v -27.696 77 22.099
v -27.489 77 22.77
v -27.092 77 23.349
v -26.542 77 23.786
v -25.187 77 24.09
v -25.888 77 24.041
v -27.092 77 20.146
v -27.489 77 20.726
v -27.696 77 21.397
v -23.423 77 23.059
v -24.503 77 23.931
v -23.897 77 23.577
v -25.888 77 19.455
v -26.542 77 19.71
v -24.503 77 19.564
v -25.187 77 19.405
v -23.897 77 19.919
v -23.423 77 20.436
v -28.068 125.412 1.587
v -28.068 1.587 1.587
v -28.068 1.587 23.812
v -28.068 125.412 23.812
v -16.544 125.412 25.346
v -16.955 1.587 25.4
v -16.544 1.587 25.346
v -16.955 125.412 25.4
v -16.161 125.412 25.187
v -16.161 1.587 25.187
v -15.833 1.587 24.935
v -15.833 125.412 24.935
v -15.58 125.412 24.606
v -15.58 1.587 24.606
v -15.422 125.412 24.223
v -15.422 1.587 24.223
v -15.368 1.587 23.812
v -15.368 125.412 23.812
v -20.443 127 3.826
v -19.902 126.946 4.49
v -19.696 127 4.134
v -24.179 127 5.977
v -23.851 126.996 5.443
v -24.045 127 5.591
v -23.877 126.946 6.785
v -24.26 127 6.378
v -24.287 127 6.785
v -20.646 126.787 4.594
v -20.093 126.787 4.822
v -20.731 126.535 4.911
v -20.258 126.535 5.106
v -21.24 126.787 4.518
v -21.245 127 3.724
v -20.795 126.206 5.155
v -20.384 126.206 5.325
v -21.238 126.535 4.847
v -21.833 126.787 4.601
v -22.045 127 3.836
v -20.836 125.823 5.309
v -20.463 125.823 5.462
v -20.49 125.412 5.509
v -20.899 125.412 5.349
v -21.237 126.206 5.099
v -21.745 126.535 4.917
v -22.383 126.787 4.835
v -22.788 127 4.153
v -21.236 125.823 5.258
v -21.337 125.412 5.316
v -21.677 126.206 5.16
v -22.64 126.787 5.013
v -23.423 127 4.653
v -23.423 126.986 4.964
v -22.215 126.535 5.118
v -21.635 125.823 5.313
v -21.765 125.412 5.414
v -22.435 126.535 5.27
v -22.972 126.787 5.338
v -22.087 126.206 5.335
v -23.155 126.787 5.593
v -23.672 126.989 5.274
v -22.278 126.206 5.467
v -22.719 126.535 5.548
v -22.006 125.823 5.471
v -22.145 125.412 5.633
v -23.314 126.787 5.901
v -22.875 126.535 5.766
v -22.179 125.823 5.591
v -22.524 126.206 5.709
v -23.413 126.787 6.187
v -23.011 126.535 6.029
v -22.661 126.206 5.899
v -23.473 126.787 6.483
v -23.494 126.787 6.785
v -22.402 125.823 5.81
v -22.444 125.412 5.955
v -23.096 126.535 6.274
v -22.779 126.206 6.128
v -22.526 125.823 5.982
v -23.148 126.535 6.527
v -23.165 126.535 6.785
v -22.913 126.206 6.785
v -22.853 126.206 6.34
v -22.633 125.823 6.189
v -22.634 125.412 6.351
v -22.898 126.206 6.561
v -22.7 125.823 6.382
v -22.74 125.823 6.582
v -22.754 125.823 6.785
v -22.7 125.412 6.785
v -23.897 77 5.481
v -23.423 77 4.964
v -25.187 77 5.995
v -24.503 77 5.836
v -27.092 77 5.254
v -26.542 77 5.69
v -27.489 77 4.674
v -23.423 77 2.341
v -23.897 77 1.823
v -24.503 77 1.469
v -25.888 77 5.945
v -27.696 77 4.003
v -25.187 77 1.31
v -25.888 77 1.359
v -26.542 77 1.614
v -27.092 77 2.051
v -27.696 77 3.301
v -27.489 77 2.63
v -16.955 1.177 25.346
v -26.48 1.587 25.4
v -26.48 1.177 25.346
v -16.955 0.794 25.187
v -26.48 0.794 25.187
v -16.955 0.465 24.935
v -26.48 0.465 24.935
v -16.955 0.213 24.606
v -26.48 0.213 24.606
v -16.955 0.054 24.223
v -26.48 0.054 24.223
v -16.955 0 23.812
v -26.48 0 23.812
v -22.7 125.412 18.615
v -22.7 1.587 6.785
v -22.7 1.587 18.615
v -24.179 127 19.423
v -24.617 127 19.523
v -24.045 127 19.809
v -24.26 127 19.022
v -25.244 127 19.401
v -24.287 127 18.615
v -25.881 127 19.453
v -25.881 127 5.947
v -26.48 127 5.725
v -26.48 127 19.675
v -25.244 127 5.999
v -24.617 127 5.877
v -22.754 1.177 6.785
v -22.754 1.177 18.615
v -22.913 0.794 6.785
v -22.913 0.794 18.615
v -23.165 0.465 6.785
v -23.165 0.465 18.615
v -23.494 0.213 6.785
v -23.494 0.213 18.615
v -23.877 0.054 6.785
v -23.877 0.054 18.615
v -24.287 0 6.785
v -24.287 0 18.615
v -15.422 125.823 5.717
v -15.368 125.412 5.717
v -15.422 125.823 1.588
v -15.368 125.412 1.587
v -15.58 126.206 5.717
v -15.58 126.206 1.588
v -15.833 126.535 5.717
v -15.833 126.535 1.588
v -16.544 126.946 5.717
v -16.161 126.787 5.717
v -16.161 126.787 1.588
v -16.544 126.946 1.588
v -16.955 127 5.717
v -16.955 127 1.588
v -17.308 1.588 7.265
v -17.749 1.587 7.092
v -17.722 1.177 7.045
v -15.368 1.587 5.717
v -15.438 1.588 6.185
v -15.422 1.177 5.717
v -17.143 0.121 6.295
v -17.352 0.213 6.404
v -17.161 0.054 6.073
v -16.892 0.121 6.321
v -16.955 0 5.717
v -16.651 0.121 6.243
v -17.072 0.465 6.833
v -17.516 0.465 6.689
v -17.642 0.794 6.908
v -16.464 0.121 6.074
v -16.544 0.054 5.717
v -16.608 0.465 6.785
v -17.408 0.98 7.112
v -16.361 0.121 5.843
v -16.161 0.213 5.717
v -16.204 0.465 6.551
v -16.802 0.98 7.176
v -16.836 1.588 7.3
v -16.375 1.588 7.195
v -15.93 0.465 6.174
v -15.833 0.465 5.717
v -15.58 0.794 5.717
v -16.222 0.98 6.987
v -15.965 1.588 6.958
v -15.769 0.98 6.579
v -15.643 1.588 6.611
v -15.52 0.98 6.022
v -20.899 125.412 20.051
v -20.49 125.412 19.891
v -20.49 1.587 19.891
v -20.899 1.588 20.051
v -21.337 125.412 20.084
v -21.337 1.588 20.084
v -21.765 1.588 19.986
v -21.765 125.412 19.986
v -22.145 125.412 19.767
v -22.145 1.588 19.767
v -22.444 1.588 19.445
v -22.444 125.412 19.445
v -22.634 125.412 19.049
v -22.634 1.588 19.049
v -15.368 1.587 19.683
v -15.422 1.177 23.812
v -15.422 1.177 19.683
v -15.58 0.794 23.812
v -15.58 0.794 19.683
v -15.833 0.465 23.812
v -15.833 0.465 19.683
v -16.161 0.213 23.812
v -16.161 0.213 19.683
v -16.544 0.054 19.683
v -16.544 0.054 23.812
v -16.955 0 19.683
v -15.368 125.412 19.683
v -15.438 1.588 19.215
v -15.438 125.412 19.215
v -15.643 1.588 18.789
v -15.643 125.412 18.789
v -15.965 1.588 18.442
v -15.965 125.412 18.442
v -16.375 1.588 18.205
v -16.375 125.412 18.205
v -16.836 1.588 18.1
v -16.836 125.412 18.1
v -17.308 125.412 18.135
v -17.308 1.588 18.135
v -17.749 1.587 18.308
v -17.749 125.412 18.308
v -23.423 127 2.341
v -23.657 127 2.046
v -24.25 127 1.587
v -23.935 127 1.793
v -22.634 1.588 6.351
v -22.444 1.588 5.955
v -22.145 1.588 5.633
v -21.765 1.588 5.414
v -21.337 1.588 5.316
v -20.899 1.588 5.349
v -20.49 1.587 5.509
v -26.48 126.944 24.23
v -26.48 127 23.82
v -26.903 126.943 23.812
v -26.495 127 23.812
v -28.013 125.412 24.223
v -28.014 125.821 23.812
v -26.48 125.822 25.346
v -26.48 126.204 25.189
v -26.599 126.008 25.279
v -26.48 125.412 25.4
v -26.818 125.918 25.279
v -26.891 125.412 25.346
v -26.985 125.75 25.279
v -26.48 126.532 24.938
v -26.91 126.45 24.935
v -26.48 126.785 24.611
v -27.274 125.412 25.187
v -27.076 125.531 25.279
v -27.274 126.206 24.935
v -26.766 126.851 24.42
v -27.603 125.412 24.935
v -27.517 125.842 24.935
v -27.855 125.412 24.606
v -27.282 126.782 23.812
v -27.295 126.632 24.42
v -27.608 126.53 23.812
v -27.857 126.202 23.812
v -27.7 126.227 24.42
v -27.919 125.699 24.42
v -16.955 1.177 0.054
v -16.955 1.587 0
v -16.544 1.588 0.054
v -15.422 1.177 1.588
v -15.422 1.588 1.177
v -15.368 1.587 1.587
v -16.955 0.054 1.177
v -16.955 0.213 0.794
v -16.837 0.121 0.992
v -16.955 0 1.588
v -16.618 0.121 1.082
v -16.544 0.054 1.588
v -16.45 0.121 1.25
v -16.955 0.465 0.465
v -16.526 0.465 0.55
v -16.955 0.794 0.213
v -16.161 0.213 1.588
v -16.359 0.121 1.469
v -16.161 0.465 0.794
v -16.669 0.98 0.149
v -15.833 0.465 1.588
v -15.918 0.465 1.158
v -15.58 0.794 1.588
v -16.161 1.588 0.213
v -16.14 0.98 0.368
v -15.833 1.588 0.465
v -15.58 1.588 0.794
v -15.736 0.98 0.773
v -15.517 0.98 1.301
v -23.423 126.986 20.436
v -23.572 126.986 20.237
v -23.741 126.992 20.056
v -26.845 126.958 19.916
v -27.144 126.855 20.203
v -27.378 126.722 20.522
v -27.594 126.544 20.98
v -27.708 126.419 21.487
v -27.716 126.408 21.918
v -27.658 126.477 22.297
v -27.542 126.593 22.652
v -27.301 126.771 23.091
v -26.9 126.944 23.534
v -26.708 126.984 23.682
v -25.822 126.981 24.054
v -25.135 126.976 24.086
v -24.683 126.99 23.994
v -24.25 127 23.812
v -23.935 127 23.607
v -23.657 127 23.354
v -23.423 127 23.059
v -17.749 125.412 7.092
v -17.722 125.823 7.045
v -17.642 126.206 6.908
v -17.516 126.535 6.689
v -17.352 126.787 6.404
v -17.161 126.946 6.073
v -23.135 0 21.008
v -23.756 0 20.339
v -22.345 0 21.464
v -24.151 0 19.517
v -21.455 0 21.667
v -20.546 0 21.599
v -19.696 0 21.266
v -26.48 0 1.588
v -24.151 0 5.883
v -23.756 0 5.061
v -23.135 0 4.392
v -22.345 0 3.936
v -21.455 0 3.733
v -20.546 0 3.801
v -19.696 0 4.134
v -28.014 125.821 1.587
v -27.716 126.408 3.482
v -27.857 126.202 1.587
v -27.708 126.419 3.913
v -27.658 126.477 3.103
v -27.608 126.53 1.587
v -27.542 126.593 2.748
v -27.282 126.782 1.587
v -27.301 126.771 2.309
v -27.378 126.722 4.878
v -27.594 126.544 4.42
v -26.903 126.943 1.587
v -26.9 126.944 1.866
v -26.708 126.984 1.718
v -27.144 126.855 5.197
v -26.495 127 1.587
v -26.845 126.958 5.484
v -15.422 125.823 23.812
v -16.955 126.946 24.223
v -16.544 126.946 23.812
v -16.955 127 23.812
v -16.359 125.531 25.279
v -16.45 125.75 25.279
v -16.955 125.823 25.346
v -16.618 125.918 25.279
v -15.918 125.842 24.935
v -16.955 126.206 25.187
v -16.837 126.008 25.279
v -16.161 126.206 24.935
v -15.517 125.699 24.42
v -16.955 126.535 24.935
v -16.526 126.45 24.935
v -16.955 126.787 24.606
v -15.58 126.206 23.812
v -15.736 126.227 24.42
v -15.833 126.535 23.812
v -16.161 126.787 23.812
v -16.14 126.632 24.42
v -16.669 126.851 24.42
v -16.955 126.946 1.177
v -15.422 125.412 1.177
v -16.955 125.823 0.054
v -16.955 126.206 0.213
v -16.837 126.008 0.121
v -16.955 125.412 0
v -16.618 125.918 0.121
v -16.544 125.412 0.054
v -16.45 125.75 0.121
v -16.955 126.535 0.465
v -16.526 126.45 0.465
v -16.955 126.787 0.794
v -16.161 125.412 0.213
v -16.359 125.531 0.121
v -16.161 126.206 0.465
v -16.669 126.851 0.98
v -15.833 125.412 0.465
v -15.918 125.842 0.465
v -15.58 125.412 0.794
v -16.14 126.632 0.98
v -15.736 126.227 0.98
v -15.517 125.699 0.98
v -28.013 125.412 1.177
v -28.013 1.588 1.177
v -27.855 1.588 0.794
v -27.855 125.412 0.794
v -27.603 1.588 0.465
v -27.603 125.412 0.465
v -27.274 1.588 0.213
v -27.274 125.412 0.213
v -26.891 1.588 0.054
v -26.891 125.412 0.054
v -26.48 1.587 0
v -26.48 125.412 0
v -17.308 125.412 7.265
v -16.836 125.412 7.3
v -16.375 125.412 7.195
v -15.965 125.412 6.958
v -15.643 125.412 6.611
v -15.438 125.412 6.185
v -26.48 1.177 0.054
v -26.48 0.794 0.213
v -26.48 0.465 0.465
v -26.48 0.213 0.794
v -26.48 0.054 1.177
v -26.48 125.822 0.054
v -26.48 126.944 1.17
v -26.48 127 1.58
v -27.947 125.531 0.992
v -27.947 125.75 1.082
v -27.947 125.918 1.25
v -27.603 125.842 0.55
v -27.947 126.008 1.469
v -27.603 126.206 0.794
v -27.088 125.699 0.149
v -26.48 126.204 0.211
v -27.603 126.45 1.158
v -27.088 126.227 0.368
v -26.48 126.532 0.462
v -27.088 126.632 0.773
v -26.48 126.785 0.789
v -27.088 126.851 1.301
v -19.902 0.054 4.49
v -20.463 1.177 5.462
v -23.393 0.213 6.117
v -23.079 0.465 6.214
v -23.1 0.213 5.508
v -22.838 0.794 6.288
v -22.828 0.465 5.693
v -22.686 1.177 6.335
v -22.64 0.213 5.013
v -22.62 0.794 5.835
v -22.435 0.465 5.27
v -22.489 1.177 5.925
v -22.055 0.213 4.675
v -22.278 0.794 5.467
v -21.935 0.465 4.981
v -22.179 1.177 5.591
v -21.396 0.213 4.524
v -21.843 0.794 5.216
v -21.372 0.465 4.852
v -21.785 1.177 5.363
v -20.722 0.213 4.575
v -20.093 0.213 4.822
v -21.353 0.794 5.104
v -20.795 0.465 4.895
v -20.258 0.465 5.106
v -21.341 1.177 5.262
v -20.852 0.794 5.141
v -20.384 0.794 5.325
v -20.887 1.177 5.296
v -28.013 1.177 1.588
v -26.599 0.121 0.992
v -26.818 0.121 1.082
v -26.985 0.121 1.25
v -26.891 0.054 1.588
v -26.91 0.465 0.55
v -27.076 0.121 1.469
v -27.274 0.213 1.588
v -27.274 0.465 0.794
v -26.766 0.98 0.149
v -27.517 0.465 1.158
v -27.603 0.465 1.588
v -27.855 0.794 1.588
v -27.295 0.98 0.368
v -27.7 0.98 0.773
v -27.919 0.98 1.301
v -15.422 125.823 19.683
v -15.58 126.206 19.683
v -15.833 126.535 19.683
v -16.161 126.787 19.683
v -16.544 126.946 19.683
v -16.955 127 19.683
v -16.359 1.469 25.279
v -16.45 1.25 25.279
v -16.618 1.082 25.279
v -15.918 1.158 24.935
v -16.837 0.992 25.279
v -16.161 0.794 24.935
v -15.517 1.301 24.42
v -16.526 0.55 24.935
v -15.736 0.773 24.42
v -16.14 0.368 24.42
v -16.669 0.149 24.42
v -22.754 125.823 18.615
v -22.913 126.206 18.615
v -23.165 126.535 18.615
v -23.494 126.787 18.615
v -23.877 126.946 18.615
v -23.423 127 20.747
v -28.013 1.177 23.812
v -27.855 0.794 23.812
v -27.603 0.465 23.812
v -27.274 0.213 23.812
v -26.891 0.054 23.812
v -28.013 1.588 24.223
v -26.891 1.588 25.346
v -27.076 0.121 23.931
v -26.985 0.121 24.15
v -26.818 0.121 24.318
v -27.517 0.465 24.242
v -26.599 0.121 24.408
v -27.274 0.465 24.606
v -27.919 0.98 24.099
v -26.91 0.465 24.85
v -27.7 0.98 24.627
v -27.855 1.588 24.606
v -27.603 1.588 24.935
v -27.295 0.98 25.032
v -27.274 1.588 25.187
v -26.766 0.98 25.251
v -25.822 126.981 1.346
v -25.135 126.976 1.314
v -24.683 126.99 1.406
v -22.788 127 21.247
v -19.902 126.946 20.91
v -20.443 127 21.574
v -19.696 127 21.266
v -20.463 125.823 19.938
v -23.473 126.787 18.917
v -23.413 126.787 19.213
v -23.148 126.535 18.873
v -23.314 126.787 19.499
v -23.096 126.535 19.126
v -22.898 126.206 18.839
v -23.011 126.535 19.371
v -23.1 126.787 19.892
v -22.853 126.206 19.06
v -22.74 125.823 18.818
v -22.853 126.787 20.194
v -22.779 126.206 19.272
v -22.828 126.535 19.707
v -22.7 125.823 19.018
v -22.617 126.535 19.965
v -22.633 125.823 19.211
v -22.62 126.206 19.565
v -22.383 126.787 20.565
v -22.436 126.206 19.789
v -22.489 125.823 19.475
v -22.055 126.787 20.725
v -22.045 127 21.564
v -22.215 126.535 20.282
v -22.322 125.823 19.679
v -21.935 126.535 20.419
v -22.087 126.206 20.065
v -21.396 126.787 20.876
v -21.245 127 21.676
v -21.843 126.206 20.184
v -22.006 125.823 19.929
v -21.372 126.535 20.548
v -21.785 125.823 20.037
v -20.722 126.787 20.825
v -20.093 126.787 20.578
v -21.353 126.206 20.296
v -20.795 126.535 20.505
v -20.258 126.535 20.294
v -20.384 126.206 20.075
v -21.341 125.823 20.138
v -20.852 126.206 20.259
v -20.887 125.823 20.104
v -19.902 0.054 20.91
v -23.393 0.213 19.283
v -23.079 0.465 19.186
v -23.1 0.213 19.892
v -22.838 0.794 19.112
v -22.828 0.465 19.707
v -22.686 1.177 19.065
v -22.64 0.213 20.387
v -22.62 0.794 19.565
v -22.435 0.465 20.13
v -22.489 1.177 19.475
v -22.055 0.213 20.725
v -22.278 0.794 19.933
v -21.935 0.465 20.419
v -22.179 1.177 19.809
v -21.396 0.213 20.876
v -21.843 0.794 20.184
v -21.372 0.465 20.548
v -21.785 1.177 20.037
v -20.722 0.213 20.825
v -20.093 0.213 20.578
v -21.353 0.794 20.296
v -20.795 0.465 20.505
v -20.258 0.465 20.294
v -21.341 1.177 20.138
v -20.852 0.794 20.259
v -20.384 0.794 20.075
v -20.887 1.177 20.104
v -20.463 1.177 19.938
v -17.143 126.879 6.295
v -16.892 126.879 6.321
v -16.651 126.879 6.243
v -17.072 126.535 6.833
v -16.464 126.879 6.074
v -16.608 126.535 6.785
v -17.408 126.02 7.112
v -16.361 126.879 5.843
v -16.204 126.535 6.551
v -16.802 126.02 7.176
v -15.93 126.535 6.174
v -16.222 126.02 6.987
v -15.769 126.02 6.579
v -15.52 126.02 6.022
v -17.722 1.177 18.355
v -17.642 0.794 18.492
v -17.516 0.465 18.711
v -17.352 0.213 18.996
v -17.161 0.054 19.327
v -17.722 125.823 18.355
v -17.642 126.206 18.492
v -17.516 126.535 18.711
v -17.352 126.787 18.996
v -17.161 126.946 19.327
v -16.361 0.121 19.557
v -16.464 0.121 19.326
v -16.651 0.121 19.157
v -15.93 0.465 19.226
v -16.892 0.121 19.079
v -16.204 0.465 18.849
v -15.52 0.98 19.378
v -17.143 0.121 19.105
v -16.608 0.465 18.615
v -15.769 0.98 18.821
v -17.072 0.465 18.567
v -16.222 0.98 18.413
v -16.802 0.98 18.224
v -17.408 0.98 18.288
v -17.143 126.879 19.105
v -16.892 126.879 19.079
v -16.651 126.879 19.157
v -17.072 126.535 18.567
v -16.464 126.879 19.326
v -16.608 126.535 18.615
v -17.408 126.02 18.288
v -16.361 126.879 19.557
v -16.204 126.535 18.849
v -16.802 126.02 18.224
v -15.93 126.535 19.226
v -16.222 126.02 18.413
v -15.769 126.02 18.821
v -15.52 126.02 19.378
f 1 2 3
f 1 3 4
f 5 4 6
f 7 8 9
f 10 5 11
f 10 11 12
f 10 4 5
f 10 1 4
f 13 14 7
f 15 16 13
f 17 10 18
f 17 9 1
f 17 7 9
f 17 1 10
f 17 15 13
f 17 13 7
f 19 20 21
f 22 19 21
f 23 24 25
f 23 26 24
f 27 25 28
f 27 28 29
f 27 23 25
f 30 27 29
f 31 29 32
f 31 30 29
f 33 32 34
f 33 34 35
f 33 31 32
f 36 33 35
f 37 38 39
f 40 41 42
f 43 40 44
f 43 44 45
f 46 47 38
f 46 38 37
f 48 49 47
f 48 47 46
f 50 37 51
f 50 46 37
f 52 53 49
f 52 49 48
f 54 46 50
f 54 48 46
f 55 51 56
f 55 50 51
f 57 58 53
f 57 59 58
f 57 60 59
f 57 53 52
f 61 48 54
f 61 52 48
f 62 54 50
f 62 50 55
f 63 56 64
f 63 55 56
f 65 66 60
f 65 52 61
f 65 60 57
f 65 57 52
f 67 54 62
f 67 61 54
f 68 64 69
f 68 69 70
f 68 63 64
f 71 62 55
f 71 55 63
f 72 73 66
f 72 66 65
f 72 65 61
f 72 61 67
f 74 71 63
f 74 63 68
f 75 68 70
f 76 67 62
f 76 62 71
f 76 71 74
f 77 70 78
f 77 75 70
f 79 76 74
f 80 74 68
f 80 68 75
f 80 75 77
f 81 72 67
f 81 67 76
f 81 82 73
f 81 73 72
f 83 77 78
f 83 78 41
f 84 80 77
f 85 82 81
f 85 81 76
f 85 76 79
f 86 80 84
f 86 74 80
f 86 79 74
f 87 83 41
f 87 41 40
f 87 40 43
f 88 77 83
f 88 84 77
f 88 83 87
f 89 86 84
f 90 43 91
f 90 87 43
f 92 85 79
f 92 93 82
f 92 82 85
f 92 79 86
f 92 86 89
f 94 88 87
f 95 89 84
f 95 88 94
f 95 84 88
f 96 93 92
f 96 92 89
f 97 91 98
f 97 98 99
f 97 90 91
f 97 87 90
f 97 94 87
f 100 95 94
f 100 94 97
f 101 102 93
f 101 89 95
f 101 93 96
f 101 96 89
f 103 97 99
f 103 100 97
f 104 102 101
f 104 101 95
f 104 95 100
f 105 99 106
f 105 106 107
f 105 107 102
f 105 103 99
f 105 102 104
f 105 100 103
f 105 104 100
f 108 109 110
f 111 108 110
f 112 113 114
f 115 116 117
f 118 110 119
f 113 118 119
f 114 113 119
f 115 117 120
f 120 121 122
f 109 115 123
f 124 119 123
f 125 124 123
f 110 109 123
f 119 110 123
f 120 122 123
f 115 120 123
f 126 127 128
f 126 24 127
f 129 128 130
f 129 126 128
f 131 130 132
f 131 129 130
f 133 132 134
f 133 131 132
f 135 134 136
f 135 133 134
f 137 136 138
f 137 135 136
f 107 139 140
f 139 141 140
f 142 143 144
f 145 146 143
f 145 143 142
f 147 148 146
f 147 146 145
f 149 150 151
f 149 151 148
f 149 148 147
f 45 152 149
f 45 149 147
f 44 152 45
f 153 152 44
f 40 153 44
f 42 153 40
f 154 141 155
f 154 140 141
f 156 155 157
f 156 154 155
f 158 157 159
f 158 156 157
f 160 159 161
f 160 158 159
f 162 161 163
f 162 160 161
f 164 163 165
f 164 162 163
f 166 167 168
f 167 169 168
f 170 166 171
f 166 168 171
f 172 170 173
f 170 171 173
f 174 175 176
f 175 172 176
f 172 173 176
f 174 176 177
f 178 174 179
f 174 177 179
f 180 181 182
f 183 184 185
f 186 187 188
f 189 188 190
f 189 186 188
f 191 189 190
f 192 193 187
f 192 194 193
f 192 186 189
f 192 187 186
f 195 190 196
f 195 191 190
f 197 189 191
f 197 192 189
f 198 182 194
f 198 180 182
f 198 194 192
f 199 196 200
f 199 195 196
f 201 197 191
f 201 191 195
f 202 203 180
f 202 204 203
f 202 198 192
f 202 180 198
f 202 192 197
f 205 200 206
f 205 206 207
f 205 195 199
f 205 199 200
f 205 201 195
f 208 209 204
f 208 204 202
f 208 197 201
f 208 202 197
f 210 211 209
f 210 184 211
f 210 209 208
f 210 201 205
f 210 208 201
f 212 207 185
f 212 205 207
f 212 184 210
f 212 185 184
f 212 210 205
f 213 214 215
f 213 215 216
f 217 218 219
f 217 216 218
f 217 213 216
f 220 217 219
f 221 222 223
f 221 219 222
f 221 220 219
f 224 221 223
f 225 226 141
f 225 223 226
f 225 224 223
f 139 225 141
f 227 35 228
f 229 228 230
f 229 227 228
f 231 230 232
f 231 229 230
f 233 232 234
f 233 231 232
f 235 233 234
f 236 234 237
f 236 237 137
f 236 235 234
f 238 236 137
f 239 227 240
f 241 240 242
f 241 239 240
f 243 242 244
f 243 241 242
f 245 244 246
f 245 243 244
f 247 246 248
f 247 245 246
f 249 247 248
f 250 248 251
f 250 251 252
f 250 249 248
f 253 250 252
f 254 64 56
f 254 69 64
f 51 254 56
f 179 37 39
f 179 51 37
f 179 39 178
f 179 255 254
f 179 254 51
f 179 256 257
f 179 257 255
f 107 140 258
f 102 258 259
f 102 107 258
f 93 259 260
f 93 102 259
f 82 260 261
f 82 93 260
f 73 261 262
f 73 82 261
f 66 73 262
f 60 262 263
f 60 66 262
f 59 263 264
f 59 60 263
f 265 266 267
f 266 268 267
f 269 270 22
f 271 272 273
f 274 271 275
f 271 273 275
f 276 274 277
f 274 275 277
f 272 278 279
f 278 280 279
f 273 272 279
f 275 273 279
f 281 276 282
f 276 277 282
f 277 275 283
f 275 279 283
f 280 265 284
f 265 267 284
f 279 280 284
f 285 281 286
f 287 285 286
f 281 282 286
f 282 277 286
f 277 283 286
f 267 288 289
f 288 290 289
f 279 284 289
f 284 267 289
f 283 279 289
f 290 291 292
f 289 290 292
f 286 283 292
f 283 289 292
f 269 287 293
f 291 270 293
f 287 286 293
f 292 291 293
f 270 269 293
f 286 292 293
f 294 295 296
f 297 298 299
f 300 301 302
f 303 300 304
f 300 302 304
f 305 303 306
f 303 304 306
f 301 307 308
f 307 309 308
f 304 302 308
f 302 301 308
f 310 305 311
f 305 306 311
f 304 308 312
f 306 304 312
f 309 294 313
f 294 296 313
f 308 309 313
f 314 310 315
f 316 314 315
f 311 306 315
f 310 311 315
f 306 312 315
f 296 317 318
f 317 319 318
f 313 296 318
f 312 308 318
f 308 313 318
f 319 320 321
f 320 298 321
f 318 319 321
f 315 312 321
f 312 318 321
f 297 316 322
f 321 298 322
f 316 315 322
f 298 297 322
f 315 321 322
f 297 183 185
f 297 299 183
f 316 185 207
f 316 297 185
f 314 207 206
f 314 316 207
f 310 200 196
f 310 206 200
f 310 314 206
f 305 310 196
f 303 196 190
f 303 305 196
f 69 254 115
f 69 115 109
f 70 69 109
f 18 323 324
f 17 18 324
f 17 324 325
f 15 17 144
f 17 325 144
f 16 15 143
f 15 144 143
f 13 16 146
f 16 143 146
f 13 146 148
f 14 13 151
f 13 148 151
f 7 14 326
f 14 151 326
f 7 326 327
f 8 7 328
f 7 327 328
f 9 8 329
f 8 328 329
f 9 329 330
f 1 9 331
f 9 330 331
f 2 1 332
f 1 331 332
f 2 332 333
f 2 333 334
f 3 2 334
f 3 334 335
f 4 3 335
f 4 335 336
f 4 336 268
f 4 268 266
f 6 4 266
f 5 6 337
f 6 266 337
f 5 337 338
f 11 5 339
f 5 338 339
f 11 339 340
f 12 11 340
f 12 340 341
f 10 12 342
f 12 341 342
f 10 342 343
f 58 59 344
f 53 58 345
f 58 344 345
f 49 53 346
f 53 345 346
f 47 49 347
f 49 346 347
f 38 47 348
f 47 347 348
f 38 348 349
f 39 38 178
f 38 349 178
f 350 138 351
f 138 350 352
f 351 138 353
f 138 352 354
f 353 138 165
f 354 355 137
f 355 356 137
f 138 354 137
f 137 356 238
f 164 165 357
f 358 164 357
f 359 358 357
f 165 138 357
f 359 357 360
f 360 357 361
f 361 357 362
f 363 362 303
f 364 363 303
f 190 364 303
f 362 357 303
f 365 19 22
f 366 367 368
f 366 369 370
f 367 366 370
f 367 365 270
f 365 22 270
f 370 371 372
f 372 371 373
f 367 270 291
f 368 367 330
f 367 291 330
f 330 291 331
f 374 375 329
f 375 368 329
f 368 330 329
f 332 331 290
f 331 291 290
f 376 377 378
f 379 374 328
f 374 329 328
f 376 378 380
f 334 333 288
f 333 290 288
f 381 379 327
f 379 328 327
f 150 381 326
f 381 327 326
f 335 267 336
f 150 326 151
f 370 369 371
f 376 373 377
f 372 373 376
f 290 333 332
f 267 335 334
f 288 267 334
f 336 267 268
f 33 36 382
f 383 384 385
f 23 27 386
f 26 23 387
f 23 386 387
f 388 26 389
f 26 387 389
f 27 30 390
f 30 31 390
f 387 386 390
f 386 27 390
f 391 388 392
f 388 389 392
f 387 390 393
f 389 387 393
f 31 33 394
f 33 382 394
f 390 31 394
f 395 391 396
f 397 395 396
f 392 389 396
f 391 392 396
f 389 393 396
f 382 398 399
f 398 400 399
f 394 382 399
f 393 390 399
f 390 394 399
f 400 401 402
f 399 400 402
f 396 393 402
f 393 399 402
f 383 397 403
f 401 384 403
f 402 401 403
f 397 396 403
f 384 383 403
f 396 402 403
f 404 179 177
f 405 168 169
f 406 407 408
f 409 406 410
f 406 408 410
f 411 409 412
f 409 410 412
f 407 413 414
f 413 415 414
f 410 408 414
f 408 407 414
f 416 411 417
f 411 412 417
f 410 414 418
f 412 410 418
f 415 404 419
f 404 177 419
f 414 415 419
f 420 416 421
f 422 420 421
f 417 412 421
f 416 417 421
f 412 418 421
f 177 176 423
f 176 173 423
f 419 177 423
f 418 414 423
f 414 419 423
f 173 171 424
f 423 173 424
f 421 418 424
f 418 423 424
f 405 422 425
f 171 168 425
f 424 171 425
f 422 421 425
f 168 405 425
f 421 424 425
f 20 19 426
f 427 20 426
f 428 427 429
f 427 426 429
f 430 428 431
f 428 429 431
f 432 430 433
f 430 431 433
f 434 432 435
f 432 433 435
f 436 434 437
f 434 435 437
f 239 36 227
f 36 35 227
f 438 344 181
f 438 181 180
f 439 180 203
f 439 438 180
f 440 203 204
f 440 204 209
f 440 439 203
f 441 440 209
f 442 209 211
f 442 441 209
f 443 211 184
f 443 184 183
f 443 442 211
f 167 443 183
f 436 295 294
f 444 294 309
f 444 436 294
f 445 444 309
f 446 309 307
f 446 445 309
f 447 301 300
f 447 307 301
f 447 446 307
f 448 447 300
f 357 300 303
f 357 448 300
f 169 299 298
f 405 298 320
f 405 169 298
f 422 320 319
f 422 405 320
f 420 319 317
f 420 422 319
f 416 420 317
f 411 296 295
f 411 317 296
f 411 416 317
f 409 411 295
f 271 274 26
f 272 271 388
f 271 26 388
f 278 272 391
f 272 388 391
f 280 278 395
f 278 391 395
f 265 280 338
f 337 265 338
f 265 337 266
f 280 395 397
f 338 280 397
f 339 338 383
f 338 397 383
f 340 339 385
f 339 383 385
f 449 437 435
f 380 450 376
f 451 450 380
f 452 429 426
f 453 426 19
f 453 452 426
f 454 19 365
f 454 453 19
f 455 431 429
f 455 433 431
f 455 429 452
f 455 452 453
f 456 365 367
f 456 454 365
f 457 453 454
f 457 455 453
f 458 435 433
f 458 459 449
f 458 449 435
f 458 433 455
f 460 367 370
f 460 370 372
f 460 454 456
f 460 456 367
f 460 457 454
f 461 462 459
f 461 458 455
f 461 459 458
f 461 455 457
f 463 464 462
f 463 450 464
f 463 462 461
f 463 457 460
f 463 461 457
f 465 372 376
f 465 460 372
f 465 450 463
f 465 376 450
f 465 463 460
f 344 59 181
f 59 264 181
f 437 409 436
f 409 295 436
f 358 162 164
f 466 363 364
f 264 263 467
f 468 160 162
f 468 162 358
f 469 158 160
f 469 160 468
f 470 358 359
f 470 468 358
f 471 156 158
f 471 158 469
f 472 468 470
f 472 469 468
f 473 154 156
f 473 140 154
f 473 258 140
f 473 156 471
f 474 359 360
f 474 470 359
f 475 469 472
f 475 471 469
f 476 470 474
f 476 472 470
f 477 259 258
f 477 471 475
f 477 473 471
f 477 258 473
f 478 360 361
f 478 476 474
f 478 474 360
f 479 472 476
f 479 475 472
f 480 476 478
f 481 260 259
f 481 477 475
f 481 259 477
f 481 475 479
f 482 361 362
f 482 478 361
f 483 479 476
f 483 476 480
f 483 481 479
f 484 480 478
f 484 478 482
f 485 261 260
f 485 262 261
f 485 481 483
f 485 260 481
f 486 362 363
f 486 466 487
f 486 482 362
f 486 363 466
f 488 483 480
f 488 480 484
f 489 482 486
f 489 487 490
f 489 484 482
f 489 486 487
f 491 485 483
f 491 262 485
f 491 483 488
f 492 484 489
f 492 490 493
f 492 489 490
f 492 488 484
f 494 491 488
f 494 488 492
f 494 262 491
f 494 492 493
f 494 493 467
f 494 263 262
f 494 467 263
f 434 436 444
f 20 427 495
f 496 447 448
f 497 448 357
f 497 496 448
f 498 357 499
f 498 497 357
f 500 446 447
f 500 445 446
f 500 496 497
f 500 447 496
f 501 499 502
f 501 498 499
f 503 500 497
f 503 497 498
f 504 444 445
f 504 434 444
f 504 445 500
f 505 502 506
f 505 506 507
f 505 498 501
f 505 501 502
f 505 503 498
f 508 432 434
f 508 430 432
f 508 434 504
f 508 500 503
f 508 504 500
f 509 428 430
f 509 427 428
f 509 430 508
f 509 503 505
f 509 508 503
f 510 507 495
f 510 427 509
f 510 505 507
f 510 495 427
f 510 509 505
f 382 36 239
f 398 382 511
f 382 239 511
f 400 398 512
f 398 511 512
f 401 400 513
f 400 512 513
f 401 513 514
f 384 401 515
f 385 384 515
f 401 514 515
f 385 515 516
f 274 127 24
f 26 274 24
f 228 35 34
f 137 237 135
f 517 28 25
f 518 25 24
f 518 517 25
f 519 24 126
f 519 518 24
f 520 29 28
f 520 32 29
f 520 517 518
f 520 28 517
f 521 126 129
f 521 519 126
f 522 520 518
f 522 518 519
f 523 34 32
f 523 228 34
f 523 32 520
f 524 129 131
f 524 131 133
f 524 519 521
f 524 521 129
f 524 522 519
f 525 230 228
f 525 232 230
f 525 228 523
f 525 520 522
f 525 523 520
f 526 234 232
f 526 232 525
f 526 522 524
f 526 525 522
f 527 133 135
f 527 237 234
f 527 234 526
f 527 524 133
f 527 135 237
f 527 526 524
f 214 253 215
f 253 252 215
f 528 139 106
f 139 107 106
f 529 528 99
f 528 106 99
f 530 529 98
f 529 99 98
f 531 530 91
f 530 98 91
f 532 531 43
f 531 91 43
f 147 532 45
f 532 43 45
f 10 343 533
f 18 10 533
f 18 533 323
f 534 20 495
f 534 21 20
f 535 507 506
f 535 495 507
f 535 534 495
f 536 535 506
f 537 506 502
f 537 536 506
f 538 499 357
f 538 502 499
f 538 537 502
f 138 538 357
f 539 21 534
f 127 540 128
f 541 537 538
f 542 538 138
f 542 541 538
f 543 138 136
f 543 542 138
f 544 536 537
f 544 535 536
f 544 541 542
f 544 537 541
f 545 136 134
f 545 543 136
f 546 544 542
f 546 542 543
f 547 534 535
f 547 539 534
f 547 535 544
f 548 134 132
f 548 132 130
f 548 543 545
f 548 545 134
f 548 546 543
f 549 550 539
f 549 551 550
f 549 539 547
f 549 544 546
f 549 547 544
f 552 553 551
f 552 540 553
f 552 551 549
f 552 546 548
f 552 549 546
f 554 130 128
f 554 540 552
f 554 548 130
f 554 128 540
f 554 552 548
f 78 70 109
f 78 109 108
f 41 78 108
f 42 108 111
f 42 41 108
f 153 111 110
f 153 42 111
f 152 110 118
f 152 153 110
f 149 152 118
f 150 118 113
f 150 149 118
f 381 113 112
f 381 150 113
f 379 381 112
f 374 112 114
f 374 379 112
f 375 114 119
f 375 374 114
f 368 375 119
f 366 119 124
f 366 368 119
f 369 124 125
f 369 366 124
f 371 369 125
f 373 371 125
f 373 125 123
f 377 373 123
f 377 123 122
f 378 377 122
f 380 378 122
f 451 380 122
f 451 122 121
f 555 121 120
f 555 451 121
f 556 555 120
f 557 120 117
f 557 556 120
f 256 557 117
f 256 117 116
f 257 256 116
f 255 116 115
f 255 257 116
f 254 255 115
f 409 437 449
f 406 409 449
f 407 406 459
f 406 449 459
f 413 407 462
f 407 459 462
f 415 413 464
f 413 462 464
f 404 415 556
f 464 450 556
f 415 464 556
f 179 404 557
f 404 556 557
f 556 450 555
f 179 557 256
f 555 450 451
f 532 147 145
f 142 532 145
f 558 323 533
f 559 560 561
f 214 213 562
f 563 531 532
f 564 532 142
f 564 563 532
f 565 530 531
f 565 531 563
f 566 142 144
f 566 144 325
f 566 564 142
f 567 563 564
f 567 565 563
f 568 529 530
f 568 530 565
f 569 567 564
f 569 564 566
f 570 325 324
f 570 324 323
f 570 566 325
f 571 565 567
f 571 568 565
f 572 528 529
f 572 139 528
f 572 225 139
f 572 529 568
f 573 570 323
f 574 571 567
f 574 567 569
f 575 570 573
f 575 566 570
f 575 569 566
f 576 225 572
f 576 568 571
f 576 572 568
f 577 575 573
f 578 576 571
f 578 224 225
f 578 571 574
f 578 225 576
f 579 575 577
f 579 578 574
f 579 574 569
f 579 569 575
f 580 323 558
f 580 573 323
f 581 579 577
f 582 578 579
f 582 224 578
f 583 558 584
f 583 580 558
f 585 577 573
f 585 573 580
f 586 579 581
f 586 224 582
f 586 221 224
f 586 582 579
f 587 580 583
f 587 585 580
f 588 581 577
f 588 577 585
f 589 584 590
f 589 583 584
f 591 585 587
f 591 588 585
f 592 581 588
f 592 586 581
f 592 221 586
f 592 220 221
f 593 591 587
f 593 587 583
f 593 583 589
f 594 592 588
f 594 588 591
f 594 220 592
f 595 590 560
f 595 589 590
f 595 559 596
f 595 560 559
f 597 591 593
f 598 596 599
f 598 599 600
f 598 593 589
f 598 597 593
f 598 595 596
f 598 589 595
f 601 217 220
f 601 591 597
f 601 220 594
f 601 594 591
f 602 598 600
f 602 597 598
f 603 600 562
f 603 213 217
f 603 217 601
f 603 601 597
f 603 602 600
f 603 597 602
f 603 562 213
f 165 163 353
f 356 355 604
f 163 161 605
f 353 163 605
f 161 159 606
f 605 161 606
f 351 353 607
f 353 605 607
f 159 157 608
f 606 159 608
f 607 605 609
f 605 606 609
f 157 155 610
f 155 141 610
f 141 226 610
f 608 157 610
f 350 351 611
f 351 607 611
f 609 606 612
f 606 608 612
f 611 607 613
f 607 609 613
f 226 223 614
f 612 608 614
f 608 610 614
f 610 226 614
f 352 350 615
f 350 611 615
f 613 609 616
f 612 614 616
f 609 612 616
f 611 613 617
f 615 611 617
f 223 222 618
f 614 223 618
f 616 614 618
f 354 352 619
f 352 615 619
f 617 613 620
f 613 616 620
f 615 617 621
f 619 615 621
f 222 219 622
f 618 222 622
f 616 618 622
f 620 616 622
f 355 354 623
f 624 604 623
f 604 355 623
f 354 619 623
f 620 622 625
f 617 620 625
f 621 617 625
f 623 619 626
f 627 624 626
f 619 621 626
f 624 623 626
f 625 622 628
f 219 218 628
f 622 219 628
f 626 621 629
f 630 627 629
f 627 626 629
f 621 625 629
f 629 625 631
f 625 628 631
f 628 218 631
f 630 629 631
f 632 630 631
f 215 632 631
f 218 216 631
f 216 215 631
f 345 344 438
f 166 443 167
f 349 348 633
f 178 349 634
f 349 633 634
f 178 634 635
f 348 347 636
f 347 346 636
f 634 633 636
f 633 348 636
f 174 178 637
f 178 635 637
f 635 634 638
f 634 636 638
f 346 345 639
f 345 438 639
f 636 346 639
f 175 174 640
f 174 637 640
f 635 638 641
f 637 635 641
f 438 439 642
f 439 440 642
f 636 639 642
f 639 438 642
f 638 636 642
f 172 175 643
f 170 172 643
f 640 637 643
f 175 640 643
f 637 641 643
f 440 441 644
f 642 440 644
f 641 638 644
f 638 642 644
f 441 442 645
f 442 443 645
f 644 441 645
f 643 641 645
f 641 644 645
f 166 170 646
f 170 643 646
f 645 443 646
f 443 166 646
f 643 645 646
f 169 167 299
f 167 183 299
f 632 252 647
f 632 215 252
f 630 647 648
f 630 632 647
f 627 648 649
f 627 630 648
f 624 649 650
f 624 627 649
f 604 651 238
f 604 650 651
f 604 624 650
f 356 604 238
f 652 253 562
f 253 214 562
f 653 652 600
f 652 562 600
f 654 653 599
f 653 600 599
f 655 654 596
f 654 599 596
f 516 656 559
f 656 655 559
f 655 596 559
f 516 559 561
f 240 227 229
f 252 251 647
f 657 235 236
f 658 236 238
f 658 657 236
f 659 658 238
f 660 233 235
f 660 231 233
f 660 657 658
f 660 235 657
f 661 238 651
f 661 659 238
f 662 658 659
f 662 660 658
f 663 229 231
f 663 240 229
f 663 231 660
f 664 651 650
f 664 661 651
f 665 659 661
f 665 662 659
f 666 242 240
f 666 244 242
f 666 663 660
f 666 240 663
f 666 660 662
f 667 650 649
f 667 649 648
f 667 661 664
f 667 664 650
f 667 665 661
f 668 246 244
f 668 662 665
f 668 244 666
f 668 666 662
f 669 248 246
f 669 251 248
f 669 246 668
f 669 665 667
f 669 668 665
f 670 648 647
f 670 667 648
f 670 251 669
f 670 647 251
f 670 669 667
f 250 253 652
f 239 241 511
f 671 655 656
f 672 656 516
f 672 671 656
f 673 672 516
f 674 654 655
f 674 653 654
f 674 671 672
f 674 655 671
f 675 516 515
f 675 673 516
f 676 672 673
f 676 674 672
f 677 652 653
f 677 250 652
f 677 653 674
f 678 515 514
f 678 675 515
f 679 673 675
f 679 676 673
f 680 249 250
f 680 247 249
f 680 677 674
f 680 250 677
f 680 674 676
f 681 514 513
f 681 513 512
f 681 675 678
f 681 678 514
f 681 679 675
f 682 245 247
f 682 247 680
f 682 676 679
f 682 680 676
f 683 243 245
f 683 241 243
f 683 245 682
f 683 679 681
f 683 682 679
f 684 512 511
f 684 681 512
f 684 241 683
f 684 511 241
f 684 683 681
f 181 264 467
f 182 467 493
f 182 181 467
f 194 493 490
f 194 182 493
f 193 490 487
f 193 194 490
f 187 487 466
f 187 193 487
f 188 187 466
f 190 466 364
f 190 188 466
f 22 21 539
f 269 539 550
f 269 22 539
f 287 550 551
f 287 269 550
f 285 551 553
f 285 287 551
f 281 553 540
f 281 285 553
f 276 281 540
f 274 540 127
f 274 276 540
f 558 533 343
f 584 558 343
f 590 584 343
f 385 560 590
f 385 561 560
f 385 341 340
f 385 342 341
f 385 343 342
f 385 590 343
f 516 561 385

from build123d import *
from OCP.BRepFilletAPI import BRepFilletAPI_MakeFillet

# Parameters (mm, degrees)
BOSS_EXTRUDE2_DEPTH = 127
FILLET1_R1          = 1.5875
FILLET1_R2          = 1.4732
CUT_EXTRUDE1_DEPTH  = 50


with BuildPart() as part:
    # Sketch1 → Boss-Extrude2 (new body)
    with BuildSketch(Plane(origin=(0, 0, 0), x_dir=(1, 0, 0), z_dir=(0, 1, 0))):
        Polygon((-28.067579909, 0), (-28.067579909, -25.4), (-15.367579909, -25.4), (-15.367579909, -16.933333333), (-22.699928279, -21.166666582), (-22.699928279, -4.233333249), (-15.367579909, -8.466666667), (-15.367579909, 0), align=None)
    extrude(amount=BOSS_EXTRUDE2_DEPTH)

    # Fillet1: one fillet with a radius per group of edges: ONE call of the kernel's fillet builder (fillet() takes one radius for all edges)
    fillet1_edges_1 = [part.edges().sort_by_distance(p)[0] for p in [
        (-19.033754094, 127, 6.349999958),
        (-22.699928279, 127, 12.699999915),
        (-19.033754094, 127, 19.049999958),
        (-15.367579909, 127, 21.166666667),
        (-15.367579909, 127, 4.233333333),
        (-21.717579909, 127, 0),
        (-28.067579909, 63.5, 0),
        (-15.367579909, 63.5, 0),
        (-21.717579909, 0, 0),
        (-15.367579909, 0, 4.233333333),
        (-15.367579909, 63.5, 8.466666667),
        (-15.367579909, 63.5, 16.933333333),
        (-15.367579909, 0, 21.166666667),
        (-15.367579909, 63.5, 25.4),
        (-22.699928279, 0, 12.699999915),
        (-28.067579909, 127, 12.7),
        (-21.717579909, 127, 25.4),
        (-28.067579909, 63.5, 25.4),
        (-28.067579909, 0, 12.7),
        (-21.717579909, 0, 25.4),
        (-19.033754094, 0, 6.349999958),
        (-19.033754094, 0, 19.049999958),
    ]]
    fillet1_edges_2 = [part.edges().sort_by_distance(p)[0] for p in [
        (-22.699928279, 63.5, 4.233333249),
        (-22.699928279, 63.5, 21.166666582),
    ]]
    fillet1 = BRepFilletAPI_MakeFillet(part.part.solid().wrapped)
    for e in fillet1_edges_1:
        fillet1.Add(FILLET1_R1, e.wrapped)
    for e in fillet1_edges_2:
        fillet1.Add(FILLET1_R2, e.wrapped)
    add(Compound.cast(fillet1.Shape()), mode=Mode.REPLACE)

    # Sketch2 → Cut-Extrude1 (cut)
    with BuildSketch(Plane(origin=(0, 127, 0), x_dir=(1, 0, 0), z_dir=(0, 1, 0))):
        with BuildLine():
            Line((-23.422549559, -2.340780121), (-23.422549559, -4.963755825))
            ThreePointArc((-23.422549559, -4.963755825), (-27.722549476, -3.652267973), (-23.422549559, -2.340780121))
        make_face()
        with BuildLine():
            Line((-23.422549559, -23.059219761), (-23.422549559, -20.436244057))
            ThreePointArc((-23.422549559, -20.436244057), (-27.722549476, -21.747731909), (-23.422549559, -23.059219761))
        make_face()
    extrude(amount=-CUT_EXTRUDE1_DEPTH, mode=Mode.SUBTRACT)


solid = part.part
